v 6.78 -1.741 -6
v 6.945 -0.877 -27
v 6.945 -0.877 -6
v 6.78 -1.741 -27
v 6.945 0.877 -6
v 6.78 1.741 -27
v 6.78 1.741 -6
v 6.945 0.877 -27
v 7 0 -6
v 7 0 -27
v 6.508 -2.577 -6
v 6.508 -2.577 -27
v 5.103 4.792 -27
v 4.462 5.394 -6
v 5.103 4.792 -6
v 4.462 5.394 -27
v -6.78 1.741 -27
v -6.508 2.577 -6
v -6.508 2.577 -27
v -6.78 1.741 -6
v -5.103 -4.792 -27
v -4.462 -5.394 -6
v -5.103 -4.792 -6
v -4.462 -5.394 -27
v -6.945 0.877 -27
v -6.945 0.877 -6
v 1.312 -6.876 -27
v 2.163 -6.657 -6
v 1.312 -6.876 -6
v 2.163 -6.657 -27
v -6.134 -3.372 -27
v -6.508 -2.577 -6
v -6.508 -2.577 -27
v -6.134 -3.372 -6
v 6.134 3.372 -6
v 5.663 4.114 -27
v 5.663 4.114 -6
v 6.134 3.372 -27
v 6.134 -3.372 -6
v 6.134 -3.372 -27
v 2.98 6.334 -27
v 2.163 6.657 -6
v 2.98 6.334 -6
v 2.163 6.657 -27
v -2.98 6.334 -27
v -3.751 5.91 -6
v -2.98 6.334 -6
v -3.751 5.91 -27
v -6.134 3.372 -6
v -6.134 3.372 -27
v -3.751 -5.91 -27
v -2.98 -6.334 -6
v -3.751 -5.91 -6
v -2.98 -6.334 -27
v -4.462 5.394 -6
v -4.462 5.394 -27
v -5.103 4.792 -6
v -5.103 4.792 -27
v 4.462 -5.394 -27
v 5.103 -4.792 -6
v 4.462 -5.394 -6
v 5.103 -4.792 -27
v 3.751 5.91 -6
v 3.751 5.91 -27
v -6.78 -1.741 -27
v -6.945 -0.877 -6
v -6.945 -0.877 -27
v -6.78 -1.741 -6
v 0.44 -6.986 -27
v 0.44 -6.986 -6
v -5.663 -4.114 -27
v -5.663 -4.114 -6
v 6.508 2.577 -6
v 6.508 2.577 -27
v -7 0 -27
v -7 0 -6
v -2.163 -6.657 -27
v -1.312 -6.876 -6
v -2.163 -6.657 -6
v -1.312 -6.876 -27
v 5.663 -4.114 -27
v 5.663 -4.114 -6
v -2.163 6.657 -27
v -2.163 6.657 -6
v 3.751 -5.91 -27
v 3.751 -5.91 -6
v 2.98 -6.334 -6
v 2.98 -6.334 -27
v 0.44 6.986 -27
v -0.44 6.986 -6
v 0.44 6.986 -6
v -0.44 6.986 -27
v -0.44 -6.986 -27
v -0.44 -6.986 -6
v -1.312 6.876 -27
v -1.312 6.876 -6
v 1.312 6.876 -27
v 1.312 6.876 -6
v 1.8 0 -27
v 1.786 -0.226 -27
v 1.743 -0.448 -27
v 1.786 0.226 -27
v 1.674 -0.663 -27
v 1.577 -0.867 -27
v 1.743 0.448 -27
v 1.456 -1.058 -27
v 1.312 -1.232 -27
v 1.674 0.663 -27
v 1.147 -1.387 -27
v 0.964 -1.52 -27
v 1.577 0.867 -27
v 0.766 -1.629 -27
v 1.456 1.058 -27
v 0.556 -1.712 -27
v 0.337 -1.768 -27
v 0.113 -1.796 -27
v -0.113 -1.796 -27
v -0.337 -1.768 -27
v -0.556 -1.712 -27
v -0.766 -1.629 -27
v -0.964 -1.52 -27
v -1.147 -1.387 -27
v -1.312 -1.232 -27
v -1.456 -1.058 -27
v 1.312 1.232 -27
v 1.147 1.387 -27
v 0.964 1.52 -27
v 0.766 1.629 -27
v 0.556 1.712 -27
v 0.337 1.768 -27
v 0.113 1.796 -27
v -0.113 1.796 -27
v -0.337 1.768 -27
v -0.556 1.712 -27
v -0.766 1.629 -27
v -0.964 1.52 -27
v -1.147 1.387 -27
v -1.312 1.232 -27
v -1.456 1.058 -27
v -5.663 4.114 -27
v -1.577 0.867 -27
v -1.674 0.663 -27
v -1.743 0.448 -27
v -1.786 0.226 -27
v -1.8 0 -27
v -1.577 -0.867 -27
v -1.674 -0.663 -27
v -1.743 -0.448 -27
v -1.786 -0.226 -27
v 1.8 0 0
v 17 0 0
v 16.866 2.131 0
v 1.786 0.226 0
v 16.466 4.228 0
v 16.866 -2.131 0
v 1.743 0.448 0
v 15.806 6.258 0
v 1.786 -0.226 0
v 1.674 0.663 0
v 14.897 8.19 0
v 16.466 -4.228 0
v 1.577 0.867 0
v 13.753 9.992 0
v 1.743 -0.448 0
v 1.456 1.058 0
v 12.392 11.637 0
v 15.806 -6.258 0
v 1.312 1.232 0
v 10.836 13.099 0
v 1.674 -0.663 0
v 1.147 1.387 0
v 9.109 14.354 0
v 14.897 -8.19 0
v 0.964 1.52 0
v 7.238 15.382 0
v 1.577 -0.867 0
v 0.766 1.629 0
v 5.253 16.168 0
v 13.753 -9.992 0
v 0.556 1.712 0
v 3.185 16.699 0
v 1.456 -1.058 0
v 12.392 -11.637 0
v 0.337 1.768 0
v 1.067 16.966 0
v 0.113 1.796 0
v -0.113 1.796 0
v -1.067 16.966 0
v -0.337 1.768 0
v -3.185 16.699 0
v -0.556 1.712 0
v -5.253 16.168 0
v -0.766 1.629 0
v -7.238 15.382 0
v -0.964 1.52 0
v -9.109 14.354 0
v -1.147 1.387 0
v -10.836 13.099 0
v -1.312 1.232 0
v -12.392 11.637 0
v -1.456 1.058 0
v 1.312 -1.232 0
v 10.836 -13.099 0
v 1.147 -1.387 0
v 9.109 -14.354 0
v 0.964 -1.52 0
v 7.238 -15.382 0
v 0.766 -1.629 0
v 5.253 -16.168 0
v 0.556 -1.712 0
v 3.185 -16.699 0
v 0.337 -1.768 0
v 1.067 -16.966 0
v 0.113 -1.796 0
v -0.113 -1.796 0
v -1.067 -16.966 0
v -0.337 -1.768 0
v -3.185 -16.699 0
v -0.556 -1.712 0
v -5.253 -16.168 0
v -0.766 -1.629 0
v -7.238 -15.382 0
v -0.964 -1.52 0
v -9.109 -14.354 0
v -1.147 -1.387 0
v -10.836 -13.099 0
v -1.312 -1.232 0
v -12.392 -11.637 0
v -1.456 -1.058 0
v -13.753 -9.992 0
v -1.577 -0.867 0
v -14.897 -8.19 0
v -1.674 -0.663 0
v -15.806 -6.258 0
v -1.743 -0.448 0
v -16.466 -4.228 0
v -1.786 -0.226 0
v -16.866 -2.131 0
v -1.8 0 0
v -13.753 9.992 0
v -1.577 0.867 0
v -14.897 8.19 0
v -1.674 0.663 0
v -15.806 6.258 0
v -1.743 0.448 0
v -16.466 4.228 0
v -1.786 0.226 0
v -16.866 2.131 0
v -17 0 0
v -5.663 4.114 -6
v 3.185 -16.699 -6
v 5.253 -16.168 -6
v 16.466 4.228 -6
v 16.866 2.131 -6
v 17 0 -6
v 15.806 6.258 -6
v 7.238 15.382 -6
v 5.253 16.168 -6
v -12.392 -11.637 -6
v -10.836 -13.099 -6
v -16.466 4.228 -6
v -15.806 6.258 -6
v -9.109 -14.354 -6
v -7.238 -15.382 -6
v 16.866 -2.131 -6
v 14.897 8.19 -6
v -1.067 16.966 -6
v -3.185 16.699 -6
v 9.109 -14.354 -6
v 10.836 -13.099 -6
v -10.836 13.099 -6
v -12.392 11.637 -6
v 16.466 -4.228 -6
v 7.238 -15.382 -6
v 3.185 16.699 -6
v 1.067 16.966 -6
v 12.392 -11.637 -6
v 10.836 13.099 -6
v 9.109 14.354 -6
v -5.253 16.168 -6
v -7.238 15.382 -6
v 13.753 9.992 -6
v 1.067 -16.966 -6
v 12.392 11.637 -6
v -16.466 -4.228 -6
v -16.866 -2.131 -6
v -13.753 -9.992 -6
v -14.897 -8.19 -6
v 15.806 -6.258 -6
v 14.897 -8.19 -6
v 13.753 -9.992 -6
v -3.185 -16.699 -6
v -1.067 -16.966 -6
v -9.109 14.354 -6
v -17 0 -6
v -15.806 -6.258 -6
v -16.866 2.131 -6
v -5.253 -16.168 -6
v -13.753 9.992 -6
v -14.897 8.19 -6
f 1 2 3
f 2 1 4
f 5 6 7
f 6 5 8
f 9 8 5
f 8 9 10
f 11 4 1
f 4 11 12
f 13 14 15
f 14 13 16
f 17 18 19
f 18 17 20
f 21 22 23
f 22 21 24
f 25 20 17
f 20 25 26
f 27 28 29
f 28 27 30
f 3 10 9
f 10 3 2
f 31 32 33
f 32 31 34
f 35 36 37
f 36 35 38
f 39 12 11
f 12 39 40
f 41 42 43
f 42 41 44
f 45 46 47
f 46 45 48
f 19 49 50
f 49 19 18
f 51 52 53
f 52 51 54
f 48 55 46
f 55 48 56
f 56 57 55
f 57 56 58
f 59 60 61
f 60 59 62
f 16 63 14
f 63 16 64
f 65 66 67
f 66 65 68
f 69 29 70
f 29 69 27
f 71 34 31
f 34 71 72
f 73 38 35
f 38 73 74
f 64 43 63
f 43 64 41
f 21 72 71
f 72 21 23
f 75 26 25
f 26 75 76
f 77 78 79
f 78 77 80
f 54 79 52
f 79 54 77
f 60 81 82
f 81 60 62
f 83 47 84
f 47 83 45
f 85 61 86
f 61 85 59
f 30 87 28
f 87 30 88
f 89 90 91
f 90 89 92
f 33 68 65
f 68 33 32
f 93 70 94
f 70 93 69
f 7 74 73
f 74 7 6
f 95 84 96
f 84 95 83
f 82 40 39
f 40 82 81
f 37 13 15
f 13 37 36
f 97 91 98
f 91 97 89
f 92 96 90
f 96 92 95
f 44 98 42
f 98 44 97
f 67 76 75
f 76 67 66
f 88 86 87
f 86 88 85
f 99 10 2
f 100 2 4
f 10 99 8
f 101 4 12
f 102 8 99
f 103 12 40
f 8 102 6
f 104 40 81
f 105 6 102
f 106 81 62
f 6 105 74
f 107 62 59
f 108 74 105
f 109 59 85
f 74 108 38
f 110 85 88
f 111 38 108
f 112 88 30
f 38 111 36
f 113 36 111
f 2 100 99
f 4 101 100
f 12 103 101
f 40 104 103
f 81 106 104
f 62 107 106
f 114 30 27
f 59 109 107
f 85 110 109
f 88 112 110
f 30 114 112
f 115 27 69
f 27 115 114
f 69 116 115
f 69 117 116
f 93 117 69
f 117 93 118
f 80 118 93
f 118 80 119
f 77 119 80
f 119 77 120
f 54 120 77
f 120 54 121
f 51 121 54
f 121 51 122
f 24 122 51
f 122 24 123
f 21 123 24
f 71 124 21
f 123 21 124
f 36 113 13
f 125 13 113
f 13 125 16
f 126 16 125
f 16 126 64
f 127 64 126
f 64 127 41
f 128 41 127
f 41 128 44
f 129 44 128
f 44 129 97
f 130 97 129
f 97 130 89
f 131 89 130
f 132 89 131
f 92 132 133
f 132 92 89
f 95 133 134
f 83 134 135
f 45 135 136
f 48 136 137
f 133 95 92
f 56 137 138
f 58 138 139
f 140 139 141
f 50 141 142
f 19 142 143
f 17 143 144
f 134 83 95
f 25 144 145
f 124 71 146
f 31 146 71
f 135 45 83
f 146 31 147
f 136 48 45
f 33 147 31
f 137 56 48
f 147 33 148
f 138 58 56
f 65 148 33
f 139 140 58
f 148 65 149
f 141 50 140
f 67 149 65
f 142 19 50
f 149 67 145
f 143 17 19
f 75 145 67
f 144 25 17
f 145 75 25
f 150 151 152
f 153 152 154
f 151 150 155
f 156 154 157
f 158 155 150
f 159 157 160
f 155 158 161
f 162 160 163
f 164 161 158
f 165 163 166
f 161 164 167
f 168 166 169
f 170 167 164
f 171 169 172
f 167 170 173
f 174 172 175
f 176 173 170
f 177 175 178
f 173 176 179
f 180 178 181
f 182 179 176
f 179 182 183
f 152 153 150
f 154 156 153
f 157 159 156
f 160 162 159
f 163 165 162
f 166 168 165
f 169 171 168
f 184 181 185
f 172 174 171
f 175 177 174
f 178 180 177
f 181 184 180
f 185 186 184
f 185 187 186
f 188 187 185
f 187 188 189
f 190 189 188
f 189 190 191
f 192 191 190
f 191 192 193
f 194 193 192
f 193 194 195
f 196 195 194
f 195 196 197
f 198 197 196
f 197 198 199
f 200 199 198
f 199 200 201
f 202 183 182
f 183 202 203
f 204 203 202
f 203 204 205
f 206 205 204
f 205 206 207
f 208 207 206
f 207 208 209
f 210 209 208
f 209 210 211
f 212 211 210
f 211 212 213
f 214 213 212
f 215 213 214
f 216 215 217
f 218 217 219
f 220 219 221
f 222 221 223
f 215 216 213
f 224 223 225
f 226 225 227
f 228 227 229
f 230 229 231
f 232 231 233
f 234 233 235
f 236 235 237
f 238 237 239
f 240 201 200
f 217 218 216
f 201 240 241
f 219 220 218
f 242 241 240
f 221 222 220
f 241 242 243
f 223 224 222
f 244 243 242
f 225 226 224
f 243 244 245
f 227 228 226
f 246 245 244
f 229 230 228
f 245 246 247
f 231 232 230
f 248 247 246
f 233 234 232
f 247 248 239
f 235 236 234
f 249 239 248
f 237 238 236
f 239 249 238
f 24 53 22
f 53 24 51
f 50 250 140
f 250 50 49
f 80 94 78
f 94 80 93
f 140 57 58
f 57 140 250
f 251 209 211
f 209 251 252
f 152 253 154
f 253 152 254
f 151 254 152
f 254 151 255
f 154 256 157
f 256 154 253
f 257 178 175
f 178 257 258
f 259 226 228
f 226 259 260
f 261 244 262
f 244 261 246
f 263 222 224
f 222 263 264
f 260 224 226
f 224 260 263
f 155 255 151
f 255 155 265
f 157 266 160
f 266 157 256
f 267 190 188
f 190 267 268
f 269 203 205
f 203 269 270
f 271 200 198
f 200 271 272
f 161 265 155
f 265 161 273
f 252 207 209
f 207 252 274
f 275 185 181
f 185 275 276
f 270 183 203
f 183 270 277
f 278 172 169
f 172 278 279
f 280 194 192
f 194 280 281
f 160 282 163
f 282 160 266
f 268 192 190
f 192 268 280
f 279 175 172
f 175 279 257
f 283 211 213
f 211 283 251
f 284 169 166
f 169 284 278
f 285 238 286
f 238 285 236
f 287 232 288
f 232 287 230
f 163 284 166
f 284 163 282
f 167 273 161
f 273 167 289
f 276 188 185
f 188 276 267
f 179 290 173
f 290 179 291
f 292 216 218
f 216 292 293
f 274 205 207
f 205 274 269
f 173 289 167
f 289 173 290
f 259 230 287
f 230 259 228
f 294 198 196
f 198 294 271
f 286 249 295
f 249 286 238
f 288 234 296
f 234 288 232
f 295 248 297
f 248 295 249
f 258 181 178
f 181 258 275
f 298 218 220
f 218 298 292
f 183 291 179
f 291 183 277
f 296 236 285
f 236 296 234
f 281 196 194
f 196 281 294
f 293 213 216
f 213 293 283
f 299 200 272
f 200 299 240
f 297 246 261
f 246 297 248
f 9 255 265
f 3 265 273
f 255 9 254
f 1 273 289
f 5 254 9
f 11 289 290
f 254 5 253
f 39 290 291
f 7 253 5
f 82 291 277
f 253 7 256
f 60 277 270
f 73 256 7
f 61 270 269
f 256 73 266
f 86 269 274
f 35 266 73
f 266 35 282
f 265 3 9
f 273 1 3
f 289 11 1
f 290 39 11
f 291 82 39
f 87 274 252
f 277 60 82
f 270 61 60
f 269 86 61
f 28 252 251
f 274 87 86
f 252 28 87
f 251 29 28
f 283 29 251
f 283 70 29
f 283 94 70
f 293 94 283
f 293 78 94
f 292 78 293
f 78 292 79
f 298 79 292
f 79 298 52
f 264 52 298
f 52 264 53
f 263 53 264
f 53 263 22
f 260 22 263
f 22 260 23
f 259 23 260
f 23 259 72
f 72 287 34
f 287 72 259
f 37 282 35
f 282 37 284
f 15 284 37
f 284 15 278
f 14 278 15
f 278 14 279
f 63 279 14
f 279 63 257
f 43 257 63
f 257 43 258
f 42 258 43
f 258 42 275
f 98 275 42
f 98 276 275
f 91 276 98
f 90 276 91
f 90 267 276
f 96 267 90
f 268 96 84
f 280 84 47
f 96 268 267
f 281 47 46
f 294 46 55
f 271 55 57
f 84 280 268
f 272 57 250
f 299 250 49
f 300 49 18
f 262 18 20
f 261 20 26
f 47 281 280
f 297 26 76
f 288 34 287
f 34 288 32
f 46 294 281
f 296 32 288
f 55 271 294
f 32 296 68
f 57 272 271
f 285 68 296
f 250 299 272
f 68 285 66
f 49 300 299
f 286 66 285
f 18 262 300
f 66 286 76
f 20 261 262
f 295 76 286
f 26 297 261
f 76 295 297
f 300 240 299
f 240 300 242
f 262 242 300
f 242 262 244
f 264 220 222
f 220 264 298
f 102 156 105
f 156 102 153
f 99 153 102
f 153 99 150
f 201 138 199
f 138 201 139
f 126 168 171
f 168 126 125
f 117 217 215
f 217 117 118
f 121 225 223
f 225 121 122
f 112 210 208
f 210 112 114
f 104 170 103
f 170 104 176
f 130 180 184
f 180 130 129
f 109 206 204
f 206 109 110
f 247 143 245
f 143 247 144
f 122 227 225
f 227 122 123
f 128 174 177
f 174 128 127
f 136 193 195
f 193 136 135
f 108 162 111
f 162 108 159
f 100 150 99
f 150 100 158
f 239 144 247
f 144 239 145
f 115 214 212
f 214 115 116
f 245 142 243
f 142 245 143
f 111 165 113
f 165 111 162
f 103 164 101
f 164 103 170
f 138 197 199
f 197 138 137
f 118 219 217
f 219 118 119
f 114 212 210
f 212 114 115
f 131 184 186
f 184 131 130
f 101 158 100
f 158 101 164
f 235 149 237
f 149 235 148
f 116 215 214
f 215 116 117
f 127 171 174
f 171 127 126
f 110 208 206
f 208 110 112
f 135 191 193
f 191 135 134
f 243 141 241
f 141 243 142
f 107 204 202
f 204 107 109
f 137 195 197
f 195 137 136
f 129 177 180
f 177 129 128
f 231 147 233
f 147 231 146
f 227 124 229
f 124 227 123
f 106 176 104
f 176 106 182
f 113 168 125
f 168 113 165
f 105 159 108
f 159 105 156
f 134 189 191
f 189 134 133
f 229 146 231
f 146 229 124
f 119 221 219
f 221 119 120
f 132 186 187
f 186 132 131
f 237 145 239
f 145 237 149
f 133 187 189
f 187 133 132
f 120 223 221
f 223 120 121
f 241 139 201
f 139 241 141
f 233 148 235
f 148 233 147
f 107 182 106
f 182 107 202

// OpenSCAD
$fn = 50;


difference() {
	union() {
		translate(v = [0, 0, -27.0000000000]) {
			cylinder(h = 27, r = 7.0000000000);
		}
		translate(v = [0, 0, -6.0000000000]) {
			cylinder(h = 6, r = 17.0000000000);
		}
	}
	union() {
		#translate(v = [0, 0, -27]) {
			cylinder(h = 27, r = 1.8000000000);
		}
	}
}
